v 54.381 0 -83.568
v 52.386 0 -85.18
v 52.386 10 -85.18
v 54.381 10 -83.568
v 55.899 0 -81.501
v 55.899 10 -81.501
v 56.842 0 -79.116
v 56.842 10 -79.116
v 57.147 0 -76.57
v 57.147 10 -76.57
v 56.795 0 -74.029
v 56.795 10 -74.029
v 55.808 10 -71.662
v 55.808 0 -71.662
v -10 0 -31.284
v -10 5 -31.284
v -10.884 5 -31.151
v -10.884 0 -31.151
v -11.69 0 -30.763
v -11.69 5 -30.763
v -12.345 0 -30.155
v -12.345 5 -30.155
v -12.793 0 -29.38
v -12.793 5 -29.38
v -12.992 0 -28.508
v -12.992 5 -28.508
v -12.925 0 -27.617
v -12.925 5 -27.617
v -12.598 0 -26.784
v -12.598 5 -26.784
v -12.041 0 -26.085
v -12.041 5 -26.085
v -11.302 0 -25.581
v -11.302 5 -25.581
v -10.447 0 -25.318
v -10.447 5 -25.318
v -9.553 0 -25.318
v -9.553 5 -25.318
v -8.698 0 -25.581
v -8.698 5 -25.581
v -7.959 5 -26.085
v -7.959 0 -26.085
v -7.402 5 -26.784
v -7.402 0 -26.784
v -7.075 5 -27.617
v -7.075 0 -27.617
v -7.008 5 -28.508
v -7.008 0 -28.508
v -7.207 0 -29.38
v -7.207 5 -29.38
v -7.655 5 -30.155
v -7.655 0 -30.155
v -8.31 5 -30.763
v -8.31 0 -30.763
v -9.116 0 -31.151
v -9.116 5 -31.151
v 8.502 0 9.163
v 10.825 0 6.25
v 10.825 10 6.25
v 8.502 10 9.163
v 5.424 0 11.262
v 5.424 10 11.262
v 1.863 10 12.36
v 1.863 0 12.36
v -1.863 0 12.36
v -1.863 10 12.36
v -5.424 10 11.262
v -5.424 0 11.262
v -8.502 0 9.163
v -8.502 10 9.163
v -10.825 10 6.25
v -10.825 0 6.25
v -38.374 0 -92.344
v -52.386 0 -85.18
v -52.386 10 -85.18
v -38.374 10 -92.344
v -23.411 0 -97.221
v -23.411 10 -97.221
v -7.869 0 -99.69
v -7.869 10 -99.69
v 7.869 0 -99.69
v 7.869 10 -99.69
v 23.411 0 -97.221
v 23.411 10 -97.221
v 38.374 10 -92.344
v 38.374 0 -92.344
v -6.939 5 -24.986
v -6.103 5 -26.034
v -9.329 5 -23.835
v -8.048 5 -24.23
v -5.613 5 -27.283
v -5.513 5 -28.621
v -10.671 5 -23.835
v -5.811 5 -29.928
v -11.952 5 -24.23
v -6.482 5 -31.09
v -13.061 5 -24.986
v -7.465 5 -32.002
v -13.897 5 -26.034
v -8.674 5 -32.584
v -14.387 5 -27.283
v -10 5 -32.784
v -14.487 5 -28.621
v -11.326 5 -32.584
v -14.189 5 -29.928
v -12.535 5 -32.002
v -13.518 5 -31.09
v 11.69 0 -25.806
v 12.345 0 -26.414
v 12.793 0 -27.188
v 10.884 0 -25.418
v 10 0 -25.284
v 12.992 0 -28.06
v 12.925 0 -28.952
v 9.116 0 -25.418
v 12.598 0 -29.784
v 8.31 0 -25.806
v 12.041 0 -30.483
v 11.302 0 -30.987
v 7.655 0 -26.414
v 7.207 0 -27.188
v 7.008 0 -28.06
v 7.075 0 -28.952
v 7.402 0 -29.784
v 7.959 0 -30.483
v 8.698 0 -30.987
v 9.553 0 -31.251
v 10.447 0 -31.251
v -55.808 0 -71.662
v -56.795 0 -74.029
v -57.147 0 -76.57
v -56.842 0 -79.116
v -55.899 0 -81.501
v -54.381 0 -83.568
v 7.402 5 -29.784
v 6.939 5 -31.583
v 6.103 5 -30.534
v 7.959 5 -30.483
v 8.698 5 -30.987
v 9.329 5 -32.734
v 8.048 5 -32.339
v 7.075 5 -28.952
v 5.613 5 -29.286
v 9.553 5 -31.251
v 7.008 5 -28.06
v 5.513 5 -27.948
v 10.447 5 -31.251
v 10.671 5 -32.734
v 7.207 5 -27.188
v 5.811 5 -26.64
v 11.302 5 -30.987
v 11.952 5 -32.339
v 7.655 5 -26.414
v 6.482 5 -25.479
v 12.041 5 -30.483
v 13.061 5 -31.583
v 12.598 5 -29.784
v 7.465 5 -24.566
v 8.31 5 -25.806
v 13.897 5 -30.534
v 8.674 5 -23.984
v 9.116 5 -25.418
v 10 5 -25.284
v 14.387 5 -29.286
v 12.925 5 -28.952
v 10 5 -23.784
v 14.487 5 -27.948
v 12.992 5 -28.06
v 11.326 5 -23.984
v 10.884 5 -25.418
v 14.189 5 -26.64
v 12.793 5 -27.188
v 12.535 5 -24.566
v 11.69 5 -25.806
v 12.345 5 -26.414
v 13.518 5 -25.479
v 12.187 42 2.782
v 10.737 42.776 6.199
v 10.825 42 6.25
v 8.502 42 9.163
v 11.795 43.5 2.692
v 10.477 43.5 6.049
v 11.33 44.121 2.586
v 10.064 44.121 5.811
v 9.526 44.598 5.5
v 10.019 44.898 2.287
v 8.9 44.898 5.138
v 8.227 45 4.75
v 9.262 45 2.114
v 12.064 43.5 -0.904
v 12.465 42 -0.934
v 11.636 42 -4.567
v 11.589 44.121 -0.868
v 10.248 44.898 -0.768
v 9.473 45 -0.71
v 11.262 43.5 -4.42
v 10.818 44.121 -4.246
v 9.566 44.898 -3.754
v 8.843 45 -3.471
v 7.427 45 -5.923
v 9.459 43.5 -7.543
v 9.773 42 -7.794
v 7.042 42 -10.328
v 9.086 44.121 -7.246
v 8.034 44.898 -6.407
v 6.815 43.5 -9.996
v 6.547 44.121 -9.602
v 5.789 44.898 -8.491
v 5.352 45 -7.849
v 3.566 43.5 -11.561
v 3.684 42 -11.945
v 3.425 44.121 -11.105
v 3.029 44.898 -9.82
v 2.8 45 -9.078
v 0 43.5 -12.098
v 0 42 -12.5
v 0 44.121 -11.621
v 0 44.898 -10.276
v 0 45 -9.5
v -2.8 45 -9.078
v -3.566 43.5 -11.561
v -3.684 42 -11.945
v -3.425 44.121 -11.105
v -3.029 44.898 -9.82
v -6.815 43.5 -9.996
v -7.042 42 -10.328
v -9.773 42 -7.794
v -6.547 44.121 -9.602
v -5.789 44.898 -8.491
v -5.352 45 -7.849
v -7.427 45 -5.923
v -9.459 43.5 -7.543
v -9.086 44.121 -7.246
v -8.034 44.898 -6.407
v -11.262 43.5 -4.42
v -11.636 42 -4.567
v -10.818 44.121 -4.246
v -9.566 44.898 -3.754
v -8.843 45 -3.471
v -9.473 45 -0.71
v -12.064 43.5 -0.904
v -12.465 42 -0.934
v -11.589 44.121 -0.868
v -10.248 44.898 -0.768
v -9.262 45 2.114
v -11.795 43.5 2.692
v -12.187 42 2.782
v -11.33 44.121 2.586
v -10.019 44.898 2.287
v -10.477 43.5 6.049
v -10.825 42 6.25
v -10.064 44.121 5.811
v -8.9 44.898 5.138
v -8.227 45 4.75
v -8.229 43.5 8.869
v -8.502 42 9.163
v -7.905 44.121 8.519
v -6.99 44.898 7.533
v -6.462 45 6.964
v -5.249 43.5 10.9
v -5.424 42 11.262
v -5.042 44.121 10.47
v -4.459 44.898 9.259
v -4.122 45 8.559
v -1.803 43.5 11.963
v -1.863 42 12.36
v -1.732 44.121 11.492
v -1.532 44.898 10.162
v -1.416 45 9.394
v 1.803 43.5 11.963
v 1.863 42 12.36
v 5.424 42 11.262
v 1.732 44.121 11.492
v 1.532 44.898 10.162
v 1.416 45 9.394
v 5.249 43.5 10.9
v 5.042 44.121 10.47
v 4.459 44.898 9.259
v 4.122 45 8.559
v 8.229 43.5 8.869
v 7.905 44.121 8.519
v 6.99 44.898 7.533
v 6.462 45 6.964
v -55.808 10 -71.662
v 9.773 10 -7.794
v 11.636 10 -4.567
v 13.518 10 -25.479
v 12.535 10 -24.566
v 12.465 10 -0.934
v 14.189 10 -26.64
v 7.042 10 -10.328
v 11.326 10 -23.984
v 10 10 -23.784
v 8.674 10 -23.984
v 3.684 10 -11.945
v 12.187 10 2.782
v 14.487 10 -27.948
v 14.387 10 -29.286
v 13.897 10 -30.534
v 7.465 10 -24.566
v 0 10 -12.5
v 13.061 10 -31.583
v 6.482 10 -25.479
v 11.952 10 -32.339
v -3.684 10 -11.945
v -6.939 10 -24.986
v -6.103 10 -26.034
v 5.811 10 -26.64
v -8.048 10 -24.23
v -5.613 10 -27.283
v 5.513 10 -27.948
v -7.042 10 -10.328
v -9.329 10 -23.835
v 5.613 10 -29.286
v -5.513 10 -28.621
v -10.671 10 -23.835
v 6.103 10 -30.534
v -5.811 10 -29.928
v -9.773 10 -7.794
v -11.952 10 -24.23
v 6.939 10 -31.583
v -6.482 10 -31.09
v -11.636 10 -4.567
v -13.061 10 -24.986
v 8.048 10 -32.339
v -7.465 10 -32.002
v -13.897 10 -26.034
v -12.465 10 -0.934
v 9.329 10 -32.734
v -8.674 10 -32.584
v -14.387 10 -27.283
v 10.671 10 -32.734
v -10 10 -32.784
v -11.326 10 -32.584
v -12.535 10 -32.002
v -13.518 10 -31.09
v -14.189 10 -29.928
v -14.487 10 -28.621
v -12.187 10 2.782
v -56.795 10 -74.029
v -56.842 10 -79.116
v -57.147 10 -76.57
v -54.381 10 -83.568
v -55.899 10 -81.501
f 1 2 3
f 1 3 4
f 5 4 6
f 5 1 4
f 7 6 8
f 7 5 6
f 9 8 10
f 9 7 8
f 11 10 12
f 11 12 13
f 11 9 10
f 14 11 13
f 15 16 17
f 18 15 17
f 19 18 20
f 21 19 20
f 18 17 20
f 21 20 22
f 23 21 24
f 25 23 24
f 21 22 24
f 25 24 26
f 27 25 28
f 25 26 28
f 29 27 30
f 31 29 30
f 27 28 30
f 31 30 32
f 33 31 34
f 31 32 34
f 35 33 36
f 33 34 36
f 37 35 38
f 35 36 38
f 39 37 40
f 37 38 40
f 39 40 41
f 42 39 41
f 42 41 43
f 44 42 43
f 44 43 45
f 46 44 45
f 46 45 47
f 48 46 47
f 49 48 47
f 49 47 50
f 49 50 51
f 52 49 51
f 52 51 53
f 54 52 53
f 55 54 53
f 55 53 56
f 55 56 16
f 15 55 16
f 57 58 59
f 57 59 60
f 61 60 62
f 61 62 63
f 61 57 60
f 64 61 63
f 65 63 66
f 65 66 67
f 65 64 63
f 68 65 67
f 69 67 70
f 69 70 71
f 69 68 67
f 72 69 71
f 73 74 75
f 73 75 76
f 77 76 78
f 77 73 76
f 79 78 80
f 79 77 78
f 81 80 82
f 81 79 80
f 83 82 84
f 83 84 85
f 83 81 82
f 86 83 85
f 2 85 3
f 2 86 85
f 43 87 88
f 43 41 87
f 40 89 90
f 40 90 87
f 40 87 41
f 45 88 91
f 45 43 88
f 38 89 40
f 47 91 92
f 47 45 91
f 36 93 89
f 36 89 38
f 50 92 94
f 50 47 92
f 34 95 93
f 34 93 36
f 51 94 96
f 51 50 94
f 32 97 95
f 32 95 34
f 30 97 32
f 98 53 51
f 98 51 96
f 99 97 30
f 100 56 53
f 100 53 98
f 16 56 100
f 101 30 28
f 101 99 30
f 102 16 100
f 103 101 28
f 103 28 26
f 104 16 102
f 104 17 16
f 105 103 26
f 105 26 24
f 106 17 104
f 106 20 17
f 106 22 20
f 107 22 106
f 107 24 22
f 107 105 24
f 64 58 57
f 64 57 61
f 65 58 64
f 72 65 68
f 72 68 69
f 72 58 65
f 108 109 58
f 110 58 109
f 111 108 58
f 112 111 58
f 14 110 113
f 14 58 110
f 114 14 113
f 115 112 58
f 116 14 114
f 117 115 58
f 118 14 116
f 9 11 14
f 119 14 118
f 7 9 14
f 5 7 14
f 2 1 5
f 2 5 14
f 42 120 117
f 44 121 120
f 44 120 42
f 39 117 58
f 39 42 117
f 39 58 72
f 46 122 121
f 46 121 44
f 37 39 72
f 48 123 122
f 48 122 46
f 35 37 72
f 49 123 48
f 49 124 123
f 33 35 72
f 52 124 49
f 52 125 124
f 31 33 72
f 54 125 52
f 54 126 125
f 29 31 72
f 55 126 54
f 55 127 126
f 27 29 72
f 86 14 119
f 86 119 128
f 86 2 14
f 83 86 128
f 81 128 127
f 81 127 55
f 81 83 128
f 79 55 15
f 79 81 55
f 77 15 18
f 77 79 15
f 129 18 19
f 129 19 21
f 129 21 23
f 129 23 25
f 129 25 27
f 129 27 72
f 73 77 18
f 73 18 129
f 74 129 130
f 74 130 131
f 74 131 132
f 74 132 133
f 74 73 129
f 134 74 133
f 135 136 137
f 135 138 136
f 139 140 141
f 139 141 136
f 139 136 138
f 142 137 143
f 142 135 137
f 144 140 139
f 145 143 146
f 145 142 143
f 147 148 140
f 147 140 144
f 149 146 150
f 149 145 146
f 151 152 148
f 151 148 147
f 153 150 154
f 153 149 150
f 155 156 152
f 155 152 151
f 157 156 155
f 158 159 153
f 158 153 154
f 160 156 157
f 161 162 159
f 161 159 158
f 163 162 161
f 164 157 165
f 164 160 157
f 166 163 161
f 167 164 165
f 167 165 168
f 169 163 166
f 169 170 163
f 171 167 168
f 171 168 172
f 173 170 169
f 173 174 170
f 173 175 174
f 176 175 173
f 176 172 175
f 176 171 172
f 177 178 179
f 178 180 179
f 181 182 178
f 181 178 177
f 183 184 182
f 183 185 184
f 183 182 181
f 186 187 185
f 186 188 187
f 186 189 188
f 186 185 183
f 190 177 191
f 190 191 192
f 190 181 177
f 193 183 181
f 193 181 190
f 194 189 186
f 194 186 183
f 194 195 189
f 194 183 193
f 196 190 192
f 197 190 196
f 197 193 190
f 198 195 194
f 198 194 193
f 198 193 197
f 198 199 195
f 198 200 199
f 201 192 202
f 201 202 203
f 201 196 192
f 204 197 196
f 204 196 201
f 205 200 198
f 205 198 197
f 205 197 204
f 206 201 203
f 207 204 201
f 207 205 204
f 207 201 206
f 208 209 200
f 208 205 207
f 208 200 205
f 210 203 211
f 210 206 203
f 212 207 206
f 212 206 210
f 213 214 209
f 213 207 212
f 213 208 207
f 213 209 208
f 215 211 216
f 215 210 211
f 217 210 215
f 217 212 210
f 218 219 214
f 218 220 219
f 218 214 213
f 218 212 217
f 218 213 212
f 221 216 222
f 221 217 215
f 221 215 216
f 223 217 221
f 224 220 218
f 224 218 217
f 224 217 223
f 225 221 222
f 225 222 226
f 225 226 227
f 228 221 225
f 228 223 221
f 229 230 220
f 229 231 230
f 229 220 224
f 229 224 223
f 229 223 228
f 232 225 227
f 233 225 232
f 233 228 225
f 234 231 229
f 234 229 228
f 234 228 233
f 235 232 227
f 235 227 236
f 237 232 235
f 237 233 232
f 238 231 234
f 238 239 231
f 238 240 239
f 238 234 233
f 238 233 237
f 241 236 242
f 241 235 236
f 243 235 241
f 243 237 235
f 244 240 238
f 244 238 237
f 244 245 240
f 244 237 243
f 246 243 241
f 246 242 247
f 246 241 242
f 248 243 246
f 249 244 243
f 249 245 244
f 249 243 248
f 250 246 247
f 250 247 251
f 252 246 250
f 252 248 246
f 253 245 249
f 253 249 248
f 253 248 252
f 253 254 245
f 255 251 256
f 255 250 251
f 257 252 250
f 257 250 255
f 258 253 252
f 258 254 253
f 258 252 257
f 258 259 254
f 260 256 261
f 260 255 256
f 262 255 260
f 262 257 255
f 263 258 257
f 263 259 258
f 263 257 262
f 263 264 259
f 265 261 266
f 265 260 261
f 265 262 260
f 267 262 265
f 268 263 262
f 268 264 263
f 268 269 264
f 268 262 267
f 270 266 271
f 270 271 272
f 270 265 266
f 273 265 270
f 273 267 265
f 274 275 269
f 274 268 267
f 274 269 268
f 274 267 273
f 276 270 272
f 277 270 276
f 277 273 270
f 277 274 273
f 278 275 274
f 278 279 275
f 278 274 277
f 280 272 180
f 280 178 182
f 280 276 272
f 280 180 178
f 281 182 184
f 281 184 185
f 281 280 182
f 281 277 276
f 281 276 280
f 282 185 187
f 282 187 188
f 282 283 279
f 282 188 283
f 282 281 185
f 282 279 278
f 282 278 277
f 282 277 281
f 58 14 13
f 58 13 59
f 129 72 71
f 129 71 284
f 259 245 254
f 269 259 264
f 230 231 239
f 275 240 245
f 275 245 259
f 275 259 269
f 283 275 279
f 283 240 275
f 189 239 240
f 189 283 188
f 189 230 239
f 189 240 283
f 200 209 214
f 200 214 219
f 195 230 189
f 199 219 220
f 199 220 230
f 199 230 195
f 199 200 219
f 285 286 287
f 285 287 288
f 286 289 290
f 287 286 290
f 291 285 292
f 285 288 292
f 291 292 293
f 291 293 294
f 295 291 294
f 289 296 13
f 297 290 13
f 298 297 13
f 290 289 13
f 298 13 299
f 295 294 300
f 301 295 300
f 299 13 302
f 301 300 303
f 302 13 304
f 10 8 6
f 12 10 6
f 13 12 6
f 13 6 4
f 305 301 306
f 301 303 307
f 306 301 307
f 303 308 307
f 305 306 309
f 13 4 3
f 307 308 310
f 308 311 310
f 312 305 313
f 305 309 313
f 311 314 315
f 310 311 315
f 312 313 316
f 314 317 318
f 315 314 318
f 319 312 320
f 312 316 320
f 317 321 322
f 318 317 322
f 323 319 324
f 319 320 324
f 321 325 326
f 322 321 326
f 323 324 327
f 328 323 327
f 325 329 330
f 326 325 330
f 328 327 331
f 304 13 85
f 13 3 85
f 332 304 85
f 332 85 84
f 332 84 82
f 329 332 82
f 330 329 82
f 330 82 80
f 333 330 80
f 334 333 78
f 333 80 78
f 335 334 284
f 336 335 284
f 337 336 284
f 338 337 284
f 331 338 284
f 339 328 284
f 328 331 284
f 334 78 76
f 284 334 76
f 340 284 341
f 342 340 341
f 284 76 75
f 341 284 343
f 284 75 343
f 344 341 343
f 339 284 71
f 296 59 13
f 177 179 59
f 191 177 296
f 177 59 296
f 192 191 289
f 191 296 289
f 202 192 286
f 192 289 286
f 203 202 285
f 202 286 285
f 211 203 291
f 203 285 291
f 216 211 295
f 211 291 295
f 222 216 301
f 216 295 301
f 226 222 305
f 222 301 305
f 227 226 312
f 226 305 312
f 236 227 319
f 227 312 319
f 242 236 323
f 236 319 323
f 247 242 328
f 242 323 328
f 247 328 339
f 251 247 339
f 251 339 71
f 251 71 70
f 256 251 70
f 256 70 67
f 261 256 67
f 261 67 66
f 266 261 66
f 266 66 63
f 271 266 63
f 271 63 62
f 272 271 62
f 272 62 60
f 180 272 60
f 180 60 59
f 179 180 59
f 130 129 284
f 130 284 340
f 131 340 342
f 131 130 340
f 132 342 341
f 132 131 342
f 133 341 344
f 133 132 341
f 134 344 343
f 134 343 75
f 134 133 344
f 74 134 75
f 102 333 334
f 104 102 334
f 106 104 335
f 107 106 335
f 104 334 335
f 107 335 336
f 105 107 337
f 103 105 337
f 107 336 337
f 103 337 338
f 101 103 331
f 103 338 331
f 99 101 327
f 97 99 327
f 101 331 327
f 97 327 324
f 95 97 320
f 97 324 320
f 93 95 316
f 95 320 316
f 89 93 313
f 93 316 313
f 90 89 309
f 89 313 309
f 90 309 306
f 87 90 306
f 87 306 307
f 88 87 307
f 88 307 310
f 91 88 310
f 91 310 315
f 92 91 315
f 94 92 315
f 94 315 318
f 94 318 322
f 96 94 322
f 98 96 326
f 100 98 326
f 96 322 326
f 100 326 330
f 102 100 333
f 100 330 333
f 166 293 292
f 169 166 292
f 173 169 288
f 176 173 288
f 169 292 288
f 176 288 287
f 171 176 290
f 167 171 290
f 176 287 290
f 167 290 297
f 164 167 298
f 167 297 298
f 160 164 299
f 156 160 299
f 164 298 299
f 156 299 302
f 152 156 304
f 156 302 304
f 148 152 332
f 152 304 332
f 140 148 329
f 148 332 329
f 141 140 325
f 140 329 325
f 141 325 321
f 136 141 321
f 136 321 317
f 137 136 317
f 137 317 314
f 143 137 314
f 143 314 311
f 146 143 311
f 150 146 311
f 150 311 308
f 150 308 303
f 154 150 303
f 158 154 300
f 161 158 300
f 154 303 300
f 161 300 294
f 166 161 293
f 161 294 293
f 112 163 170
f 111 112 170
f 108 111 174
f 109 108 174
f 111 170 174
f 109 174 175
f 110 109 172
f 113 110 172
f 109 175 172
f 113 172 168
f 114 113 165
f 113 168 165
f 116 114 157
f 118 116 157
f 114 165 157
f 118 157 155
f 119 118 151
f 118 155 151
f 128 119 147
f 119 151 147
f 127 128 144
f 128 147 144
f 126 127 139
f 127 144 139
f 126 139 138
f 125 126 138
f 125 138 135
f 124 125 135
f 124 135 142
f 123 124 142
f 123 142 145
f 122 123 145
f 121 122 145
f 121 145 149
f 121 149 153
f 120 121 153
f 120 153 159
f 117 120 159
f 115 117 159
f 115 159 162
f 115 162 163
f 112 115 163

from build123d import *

# Parameters (mm, degrees)
BOSS_EXTRUDE1_DEPTH = 10
SKETCH2_R           = 4.5
CUT_EXTRUDE1_DEPTH  = 5
SKETCH3_R           = 3
CUT_EXTRUDE2_DEPTH  = 116.610810509
SKETCH4_R           = 12.5
BOSS_EXTRUDE2_DEPTH = 35
FILLET1_R           = 3


with BuildPart() as part:
    # Sketch1 → Boss-Extrude1 (new body)
    with BuildSketch(Plane(origin=(0, 0, 0), x_dir=(1, 0, 0), z_dir=(0, 1, 0))):
        with BuildLine():
            Line((-10.825317547, -6.25), (-55.807953086, 71.662210211))
            ThreePointArc((-55.807953086, 71.662210211), (-56.841976003, 79.115981661), (-52.386332276, 85.180233568))
            ThreePointArc((-52.386332276, 85.180233568), (0, 100), (52.386332276, 85.180233568))
            ThreePointArc((52.386332276, 85.180233568), (56.841976003, 79.115981661), (55.807953086, 71.662210211))
            Line((55.807953086, 71.662210211), (10.825317547, -6.25))
            ThreePointArc((10.825317547, -6.25), (0, -12.5), (-10.825317547, -6.25))
        make_face()
    extrude(amount=BOSS_EXTRUDE1_DEPTH)

    # Sketch2 → Cut-Extrude1 (cut)
    with BuildSketch(Plane(origin=(0, 10, 0), x_dir=(1, 0, 0), z_dir=(0, 1, 0))):
        with Locations(Location((10, 28.284271247, 0), (0, 0, 270))):
            Circle(SKETCH2_R)
        with Locations(Location((-10, 28.284271247, 0), (0, 0, 90))):
            Circle(SKETCH2_R)
    extrude(amount=-CUT_EXTRUDE1_DEPTH, mode=Mode.SUBTRACT)

    # Sketch3 → Cut-Extrude2 (cut, through all)
    with BuildSketch(Plane(origin=(0, 10, 0), x_dir=(1, 0, 0), z_dir=(0, 1, 0))):
        with Locations(Location((10, 28.284271247, 0), (0, 0, 270))):
            Circle(SKETCH3_R)
        with Locations(Location((-10, 28.284271247, 0), (0, 0, 90))):
            Circle(SKETCH3_R)
    extrude(amount=-CUT_EXTRUDE2_DEPTH, mode=Mode.SUBTRACT)

    # Sketch4 → Boss-Extrude2 (add)
    with BuildSketch(Plane(origin=(0, 10, 0), x_dir=(1, 0, 0), z_dir=(0, 1, 0))):
        with Locations(Location((0, 0, 0), (0, 0, 330))):
            Circle(SKETCH4_R)
    extrude(amount=BOSS_EXTRUDE2_DEPTH)

    # Fillet1
    fillet1_edges = [part.edges().sort_by_distance(p)[0] for p in [
        (-10.825317547, 45, -6.25),
    ]]
    fillet(fillet1_edges, radius=FILLET1_R)


solid = part.part
